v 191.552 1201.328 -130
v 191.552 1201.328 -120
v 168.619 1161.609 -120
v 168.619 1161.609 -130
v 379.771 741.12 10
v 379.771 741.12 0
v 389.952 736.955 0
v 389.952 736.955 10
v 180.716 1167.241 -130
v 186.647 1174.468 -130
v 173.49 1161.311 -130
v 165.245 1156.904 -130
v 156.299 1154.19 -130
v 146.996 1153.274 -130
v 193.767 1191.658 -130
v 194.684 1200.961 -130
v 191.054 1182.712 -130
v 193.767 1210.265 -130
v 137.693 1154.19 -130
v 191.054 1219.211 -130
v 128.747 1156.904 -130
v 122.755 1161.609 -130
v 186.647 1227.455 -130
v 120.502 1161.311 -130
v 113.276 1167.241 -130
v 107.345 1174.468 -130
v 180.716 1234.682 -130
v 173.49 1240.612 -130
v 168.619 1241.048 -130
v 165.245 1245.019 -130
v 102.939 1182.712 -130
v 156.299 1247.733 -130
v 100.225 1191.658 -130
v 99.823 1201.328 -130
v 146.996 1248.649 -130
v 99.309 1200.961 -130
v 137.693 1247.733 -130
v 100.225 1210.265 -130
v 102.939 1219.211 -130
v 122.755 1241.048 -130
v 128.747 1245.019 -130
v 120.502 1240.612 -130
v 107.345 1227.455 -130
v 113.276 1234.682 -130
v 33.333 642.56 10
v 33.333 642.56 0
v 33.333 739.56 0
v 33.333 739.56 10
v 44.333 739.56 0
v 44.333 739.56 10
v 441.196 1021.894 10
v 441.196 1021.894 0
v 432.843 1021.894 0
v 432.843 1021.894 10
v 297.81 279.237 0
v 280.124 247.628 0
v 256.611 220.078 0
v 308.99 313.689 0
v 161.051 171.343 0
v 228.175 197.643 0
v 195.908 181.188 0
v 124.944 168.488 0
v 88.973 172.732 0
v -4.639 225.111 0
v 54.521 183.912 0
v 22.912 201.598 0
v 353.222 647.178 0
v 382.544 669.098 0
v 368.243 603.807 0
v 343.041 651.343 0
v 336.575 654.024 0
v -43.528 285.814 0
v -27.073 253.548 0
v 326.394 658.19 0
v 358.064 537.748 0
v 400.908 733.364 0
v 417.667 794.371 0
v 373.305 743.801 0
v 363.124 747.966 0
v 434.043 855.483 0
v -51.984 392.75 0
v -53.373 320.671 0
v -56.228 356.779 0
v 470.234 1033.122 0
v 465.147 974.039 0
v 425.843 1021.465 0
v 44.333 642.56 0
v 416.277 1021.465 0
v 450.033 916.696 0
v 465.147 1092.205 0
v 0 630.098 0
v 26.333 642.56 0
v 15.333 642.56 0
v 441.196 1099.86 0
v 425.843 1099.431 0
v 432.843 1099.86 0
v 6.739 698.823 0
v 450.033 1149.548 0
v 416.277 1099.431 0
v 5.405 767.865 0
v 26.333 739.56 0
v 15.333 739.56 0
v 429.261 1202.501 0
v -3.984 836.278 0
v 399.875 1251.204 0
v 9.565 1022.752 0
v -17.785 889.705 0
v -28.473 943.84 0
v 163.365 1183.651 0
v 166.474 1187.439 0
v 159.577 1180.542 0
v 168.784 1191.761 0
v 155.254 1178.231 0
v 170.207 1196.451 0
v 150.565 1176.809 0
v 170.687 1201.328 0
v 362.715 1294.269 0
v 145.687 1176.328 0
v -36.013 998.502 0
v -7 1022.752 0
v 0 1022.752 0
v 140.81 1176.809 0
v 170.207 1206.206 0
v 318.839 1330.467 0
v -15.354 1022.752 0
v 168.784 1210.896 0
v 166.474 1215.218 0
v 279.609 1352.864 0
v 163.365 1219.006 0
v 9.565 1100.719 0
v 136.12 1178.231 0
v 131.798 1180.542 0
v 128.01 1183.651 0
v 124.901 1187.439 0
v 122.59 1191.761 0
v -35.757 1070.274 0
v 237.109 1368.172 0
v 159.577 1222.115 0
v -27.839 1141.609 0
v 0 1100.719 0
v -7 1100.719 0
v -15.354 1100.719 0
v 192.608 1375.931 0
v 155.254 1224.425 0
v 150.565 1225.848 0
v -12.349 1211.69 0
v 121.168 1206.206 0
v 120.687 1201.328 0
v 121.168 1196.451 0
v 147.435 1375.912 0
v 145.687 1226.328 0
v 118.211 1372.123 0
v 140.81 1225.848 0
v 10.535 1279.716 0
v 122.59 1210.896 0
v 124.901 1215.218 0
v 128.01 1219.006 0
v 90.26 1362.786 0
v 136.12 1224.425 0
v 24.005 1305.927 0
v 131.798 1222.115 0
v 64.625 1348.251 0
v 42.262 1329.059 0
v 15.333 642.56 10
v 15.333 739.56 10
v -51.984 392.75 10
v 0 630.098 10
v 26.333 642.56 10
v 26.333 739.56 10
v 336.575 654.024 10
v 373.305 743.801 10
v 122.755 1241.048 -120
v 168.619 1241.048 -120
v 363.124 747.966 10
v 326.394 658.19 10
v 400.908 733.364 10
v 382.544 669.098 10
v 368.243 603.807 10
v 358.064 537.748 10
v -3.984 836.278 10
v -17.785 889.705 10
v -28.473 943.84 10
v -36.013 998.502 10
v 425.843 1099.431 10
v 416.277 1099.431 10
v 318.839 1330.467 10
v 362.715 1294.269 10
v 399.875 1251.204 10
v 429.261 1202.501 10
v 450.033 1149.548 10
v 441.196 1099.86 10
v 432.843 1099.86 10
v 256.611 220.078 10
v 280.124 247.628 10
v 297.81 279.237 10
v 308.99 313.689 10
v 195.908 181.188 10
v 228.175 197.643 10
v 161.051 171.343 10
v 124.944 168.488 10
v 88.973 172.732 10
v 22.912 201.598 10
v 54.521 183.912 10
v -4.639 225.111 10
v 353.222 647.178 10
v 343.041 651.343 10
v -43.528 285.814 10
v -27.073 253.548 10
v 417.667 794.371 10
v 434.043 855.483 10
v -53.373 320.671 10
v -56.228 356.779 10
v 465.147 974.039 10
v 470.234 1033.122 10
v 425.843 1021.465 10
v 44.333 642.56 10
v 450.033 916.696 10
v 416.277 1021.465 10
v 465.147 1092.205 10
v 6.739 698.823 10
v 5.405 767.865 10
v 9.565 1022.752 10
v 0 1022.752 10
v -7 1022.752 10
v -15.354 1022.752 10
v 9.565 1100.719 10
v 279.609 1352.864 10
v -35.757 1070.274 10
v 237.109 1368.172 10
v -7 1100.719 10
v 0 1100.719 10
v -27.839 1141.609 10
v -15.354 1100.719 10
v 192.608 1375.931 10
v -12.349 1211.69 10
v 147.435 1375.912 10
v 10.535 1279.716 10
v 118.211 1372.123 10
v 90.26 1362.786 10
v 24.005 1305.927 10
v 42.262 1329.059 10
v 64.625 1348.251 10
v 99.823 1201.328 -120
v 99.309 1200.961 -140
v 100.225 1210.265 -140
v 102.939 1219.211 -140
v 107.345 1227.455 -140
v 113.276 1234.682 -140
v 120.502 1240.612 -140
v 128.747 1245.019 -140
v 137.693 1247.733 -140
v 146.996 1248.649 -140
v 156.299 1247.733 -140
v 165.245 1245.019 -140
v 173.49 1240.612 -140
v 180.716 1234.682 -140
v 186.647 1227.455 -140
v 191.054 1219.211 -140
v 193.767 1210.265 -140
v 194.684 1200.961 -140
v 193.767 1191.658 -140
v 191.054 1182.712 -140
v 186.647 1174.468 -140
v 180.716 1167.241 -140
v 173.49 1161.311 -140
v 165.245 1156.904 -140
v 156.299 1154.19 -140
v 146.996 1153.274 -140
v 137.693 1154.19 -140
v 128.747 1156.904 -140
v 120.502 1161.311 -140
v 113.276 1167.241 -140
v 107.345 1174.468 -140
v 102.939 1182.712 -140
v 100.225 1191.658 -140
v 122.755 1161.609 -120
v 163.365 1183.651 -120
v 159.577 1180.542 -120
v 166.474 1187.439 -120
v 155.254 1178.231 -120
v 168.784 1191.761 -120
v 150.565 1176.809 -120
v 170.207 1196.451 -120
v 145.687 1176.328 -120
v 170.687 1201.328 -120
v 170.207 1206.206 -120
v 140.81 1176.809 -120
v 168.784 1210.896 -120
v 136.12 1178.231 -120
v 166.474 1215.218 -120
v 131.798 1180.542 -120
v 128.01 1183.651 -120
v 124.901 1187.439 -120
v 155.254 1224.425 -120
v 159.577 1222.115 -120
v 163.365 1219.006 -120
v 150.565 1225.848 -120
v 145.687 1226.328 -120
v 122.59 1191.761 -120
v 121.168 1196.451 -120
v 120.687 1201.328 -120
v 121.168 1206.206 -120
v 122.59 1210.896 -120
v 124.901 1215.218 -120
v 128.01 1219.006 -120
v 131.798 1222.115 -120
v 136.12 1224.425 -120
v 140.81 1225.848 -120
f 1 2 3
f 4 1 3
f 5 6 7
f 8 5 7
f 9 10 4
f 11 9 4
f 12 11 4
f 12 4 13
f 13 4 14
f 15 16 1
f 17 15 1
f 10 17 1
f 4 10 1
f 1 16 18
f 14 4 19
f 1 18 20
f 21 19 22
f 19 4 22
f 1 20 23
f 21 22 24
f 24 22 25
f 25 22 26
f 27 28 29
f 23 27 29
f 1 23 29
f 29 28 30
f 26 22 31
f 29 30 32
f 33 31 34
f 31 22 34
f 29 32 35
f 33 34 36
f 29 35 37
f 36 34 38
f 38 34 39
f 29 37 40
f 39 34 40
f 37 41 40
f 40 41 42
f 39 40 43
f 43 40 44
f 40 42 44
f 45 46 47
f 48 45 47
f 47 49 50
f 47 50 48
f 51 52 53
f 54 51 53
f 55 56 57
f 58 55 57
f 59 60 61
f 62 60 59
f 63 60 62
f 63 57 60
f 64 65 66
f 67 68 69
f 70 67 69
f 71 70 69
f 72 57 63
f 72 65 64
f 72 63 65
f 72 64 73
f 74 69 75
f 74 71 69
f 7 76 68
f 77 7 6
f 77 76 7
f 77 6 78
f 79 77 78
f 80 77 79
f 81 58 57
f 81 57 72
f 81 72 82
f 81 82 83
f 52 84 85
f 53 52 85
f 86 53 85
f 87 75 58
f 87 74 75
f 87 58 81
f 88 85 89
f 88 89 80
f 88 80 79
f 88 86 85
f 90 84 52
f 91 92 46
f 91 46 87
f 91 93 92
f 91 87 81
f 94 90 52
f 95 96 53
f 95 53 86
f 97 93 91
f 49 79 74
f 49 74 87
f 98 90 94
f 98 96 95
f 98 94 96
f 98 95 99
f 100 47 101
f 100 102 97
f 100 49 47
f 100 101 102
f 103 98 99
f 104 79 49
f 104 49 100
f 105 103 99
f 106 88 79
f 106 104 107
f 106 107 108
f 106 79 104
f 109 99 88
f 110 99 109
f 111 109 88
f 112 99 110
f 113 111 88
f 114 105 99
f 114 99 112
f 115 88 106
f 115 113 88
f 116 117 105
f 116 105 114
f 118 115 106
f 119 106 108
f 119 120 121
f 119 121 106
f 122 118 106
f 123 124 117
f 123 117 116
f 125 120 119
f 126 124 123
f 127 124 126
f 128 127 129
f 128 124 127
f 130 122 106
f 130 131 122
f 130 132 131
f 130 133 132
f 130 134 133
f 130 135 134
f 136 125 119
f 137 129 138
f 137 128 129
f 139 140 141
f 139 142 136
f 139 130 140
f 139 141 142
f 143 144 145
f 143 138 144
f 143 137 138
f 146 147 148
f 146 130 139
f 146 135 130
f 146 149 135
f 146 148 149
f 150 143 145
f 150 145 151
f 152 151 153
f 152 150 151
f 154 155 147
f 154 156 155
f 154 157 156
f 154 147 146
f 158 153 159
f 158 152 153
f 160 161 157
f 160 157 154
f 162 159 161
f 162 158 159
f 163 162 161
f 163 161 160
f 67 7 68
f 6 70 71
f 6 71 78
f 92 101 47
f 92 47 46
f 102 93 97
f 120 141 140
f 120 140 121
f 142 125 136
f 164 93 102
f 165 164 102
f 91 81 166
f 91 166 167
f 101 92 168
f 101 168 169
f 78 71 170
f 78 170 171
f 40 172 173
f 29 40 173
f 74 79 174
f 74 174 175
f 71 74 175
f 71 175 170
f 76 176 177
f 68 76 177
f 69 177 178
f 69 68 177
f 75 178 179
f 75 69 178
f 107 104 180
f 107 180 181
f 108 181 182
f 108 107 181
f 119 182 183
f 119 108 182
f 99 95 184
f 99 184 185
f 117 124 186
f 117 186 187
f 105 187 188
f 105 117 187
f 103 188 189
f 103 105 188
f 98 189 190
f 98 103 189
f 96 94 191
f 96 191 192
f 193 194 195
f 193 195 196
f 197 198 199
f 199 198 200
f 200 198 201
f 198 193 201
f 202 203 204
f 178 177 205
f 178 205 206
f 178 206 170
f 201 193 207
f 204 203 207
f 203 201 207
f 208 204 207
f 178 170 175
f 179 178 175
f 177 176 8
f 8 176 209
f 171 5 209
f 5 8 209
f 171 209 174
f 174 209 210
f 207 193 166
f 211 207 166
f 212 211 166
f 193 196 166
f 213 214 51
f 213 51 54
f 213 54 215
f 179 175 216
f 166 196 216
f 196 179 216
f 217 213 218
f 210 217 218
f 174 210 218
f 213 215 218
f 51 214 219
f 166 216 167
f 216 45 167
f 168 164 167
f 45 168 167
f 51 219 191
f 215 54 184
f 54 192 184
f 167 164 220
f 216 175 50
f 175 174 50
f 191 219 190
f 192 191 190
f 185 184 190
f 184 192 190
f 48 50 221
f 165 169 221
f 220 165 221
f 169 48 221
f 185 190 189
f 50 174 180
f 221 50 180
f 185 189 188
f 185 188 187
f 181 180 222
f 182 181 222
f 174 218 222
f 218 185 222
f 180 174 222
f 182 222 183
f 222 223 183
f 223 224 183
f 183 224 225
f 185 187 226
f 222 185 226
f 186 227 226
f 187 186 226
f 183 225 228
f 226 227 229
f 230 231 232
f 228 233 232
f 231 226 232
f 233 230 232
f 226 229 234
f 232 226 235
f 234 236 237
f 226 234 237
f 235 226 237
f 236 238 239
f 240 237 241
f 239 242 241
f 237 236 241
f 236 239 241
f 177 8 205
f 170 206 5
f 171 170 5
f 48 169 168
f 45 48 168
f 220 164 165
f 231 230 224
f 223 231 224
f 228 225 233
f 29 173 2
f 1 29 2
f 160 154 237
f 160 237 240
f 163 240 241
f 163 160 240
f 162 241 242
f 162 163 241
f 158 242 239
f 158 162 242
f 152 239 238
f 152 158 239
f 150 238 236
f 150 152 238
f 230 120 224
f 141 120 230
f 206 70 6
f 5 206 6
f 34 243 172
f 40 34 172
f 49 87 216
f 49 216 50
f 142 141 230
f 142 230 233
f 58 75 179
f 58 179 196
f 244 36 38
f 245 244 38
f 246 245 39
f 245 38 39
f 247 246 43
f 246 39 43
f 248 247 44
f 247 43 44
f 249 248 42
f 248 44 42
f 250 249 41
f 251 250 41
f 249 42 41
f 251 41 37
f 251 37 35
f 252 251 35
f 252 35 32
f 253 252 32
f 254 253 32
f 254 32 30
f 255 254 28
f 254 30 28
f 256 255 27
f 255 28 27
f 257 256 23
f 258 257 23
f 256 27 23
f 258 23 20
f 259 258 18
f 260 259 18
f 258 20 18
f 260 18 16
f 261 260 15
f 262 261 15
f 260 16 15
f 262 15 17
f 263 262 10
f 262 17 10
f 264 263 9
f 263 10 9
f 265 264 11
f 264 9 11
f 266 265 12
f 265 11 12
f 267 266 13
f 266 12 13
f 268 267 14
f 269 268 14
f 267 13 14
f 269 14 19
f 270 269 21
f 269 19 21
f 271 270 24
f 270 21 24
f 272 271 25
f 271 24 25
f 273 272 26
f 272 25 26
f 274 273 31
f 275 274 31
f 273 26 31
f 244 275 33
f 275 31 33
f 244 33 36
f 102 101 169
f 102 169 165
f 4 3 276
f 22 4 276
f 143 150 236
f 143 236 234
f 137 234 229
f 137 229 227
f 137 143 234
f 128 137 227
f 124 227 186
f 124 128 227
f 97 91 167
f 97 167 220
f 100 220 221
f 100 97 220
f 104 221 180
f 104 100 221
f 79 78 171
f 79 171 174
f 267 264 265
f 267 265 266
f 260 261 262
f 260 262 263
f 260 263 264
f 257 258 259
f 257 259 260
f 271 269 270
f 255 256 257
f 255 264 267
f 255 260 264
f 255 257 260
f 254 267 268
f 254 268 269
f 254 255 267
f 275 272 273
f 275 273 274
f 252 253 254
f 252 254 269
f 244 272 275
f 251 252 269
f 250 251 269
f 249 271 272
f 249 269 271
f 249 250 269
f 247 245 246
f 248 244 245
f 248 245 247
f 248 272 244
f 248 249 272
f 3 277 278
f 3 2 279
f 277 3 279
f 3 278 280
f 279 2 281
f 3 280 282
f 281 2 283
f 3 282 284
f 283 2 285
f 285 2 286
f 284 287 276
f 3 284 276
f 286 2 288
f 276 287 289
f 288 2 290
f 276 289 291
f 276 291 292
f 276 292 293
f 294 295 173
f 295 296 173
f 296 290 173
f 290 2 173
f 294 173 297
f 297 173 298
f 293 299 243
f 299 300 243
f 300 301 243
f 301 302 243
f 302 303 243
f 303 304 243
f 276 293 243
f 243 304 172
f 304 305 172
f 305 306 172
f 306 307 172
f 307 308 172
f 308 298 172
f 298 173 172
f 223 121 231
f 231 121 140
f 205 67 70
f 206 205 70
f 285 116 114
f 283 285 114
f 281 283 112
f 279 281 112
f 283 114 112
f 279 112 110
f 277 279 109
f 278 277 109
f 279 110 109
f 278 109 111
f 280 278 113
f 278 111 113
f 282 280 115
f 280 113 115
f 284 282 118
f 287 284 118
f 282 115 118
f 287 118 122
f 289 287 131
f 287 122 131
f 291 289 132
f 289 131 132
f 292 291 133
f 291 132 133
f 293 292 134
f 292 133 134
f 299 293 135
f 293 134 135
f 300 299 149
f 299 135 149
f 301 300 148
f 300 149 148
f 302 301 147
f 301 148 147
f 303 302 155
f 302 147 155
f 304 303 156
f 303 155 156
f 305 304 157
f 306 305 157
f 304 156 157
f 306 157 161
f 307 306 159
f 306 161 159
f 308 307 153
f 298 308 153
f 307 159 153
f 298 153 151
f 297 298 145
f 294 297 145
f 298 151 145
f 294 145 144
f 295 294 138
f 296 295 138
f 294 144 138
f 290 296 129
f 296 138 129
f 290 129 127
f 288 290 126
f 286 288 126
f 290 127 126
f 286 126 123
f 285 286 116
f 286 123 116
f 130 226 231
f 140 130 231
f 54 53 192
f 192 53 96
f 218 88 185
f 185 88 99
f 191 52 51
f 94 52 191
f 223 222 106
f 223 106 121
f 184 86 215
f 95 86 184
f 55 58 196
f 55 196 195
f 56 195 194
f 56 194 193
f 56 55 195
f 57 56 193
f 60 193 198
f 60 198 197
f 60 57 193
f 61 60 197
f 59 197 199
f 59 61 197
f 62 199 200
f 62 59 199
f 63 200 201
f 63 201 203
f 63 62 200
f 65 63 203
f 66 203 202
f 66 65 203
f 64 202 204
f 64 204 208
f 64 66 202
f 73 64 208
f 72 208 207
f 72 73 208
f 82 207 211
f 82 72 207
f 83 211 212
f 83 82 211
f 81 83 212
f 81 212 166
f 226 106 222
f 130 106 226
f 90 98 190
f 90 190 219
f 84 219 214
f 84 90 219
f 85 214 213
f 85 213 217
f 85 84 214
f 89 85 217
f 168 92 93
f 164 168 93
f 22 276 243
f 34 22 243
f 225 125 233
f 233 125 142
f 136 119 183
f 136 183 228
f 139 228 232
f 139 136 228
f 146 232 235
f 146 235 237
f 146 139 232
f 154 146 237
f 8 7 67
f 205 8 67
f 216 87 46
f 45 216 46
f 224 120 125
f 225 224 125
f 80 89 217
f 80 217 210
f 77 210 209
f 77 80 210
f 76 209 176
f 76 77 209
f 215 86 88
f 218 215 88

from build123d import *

# Parameters (mm, degrees)
BOSS_EXTRUDE1_DEPTH = 10
SKETCH3_W           = 9.565213244
SKETCH3_H           = 77.966410476
SKETCH3_W_2         = 8.353543979
SKETCH3_H_2         = 77.966410475
CUT_EXTRUDE1_DEPTH  = 250
SKETCH4_W           = 11
SKETCH4_H           = 97
CUT_EXTRUDE2_DEPTH  = 250
SKETCH5_R           = 25
BOSS_EXTRUDE2_DEPTH = 120
BOSS_EXTRUDE3_DEPTH = 10
SKETCH10_R          = 47.687508242
BOSS_EXTRUDE4_DEPTH = 10


with BuildPart() as part:
    # Sketch1 → Boss-Extrude1 (new body)
    with BuildSketch(Plane.XY):
        with BuildLine():
            Line((-51.984126252, 392.74957316), (0, 630.098149599))
            ThreePointArc((0, 630.098149599), (7.08288491, 733.363548715), (-3.984096645, 836.278231013))
            ThreePointArc((-3.984096645, 836.278231013), (-23.520457502, 916.694909006), (-36.012597338, 998.502353272))
            ThreePointArc((-36.012597338, 998.502353272), (-27.83897086, 1141.608720593), (10.535208392, 1279.716153066))
            ThreePointArc((10.535208392, 1279.716153066), (64.625002116, 1348.250843062), (147.435292888, 1375.912463775))
            ThreePointArc((147.435292888, 1375.912463775), (237.109169245, 1368.171524242), (318.838797646, 1330.467491469))
            ThreePointArc((318.838797646, 1330.467491469), (399.875156257, 1251.203752857), (450.033178317, 1149.548430819))
            ThreePointArc((450.033178317, 1149.548430819), (470.234397487, 1033.122029824), (450.033178317, 916.695628829))
            ThreePointArc((450.033178317, 916.695628829), (425.902967507, 824.914102712), (400.908098576, 733.364268538))
            ThreePointArc((400.908098576, 733.364268538), (374.881556851, 636.564375255), (358.063754215, 537.74756632))
            Line((358.063754215, 537.74756632), (308.99038073, 313.688874225))
            ThreePointArc((308.99038073, 313.688874225), (88.972777771, 172.731970202), (-51.984126252, 392.74957316))
        make_face()
    extrude(amount=BOSS_EXTRUDE1_DEPTH)

    # Sketch3 → Cut-Extrude1 (cut)
    with BuildSketch(Plane(origin=(0, 0, 0), x_dir=(-1, 0, 0), z_dir=(0, 0, -1))):
        with Locations((-4.782606622, 1061.735695438)):
            Rectangle(SKETCH3_W, SKETCH3_H)
        with Locations((11.17677199, 1061.735695438)):
            Rectangle(SKETCH3_W_2, SKETCH3_H)
        with Locations((-437.019311557, 1060.877248381)):
            Rectangle(SKETCH3_W_2, SKETCH3_H_2)
        with Locations((-421.059932945, 1060.448024852)):
            Rectangle(SKETCH3_W, SKETCH3_H_2)
    extrude(amount=-CUT_EXTRUDE1_DEPTH, mode=Mode.SUBTRACT)

    # Sketch4 → Cut-Extrude2 (cut)
    with BuildSketch(Plane(origin=(0, 0, 0), x_dir=(-1, 0, 0), z_dir=(0, 0, -1))):
        with Locations((-38.83297081, 691.059824561)):
            Rectangle(SKETCH4_W, SKETCH4_H)
        with Locations((-20.83297081, 691.059824561)):
            Rectangle(SKETCH4_W, SKETCH4_H)
        Polygon((-363.124216695, 747.966415693), (-326.394029606, 658.189506878), (-336.574916173, 654.024227929), (-373.305103262, 743.801136745), align=None)
        Polygon((-389.952232486, 736.954664741), (-353.222045397, 647.177755926), (-343.041158831, 651.343034874), (-379.77134592, 741.119943689), align=None)
    extrude(amount=-CUT_EXTRUDE2_DEPTH, mode=Mode.SUBTRACT)

    # Sketch5 → Boss-Extrude2 (add)
    with BuildSketch(Plane(origin=(0, 0, 0), x_dir=(-1, 0, 0), z_dir=(0, 0, -1))):
        with Locations(Location((-145.68729474, 1201.328438708, 0), (0, 0, 180))):
            Circle(SKETCH5_R)
    extrude(amount=BOSS_EXTRUDE2_DEPTH)

    # Sketch6 → Boss-Extrude3 (add)
    with BuildSketch(Plane(origin=(0, 0, -120), x_dir=(-1, 0, 0), z_dir=(0, 0, -1))):
        Polygon((-99.823082616, 1201.328438708), (-122.755188678, 1241.048011532), (-168.619400802, 1241.048011532), (-191.551506864, 1201.328438708), (-168.619400802, 1161.608865884), (-122.755188678, 1161.608865884), align=None)
    extrude(amount=BOSS_EXTRUDE3_DEPTH)

    # Sketch10 → Boss-Extrude4 (add)
    with BuildSketch(Plane(origin=(0, 0, -130), x_dir=(-1, 0, 0), z_dir=(0, 0, -1))):
        with Locations((-146.996021508, 1200.961482621)):
            Circle(SKETCH10_R)
    extrude(amount=BOSS_EXTRUDE4_DEPTH)


solid = part.part
